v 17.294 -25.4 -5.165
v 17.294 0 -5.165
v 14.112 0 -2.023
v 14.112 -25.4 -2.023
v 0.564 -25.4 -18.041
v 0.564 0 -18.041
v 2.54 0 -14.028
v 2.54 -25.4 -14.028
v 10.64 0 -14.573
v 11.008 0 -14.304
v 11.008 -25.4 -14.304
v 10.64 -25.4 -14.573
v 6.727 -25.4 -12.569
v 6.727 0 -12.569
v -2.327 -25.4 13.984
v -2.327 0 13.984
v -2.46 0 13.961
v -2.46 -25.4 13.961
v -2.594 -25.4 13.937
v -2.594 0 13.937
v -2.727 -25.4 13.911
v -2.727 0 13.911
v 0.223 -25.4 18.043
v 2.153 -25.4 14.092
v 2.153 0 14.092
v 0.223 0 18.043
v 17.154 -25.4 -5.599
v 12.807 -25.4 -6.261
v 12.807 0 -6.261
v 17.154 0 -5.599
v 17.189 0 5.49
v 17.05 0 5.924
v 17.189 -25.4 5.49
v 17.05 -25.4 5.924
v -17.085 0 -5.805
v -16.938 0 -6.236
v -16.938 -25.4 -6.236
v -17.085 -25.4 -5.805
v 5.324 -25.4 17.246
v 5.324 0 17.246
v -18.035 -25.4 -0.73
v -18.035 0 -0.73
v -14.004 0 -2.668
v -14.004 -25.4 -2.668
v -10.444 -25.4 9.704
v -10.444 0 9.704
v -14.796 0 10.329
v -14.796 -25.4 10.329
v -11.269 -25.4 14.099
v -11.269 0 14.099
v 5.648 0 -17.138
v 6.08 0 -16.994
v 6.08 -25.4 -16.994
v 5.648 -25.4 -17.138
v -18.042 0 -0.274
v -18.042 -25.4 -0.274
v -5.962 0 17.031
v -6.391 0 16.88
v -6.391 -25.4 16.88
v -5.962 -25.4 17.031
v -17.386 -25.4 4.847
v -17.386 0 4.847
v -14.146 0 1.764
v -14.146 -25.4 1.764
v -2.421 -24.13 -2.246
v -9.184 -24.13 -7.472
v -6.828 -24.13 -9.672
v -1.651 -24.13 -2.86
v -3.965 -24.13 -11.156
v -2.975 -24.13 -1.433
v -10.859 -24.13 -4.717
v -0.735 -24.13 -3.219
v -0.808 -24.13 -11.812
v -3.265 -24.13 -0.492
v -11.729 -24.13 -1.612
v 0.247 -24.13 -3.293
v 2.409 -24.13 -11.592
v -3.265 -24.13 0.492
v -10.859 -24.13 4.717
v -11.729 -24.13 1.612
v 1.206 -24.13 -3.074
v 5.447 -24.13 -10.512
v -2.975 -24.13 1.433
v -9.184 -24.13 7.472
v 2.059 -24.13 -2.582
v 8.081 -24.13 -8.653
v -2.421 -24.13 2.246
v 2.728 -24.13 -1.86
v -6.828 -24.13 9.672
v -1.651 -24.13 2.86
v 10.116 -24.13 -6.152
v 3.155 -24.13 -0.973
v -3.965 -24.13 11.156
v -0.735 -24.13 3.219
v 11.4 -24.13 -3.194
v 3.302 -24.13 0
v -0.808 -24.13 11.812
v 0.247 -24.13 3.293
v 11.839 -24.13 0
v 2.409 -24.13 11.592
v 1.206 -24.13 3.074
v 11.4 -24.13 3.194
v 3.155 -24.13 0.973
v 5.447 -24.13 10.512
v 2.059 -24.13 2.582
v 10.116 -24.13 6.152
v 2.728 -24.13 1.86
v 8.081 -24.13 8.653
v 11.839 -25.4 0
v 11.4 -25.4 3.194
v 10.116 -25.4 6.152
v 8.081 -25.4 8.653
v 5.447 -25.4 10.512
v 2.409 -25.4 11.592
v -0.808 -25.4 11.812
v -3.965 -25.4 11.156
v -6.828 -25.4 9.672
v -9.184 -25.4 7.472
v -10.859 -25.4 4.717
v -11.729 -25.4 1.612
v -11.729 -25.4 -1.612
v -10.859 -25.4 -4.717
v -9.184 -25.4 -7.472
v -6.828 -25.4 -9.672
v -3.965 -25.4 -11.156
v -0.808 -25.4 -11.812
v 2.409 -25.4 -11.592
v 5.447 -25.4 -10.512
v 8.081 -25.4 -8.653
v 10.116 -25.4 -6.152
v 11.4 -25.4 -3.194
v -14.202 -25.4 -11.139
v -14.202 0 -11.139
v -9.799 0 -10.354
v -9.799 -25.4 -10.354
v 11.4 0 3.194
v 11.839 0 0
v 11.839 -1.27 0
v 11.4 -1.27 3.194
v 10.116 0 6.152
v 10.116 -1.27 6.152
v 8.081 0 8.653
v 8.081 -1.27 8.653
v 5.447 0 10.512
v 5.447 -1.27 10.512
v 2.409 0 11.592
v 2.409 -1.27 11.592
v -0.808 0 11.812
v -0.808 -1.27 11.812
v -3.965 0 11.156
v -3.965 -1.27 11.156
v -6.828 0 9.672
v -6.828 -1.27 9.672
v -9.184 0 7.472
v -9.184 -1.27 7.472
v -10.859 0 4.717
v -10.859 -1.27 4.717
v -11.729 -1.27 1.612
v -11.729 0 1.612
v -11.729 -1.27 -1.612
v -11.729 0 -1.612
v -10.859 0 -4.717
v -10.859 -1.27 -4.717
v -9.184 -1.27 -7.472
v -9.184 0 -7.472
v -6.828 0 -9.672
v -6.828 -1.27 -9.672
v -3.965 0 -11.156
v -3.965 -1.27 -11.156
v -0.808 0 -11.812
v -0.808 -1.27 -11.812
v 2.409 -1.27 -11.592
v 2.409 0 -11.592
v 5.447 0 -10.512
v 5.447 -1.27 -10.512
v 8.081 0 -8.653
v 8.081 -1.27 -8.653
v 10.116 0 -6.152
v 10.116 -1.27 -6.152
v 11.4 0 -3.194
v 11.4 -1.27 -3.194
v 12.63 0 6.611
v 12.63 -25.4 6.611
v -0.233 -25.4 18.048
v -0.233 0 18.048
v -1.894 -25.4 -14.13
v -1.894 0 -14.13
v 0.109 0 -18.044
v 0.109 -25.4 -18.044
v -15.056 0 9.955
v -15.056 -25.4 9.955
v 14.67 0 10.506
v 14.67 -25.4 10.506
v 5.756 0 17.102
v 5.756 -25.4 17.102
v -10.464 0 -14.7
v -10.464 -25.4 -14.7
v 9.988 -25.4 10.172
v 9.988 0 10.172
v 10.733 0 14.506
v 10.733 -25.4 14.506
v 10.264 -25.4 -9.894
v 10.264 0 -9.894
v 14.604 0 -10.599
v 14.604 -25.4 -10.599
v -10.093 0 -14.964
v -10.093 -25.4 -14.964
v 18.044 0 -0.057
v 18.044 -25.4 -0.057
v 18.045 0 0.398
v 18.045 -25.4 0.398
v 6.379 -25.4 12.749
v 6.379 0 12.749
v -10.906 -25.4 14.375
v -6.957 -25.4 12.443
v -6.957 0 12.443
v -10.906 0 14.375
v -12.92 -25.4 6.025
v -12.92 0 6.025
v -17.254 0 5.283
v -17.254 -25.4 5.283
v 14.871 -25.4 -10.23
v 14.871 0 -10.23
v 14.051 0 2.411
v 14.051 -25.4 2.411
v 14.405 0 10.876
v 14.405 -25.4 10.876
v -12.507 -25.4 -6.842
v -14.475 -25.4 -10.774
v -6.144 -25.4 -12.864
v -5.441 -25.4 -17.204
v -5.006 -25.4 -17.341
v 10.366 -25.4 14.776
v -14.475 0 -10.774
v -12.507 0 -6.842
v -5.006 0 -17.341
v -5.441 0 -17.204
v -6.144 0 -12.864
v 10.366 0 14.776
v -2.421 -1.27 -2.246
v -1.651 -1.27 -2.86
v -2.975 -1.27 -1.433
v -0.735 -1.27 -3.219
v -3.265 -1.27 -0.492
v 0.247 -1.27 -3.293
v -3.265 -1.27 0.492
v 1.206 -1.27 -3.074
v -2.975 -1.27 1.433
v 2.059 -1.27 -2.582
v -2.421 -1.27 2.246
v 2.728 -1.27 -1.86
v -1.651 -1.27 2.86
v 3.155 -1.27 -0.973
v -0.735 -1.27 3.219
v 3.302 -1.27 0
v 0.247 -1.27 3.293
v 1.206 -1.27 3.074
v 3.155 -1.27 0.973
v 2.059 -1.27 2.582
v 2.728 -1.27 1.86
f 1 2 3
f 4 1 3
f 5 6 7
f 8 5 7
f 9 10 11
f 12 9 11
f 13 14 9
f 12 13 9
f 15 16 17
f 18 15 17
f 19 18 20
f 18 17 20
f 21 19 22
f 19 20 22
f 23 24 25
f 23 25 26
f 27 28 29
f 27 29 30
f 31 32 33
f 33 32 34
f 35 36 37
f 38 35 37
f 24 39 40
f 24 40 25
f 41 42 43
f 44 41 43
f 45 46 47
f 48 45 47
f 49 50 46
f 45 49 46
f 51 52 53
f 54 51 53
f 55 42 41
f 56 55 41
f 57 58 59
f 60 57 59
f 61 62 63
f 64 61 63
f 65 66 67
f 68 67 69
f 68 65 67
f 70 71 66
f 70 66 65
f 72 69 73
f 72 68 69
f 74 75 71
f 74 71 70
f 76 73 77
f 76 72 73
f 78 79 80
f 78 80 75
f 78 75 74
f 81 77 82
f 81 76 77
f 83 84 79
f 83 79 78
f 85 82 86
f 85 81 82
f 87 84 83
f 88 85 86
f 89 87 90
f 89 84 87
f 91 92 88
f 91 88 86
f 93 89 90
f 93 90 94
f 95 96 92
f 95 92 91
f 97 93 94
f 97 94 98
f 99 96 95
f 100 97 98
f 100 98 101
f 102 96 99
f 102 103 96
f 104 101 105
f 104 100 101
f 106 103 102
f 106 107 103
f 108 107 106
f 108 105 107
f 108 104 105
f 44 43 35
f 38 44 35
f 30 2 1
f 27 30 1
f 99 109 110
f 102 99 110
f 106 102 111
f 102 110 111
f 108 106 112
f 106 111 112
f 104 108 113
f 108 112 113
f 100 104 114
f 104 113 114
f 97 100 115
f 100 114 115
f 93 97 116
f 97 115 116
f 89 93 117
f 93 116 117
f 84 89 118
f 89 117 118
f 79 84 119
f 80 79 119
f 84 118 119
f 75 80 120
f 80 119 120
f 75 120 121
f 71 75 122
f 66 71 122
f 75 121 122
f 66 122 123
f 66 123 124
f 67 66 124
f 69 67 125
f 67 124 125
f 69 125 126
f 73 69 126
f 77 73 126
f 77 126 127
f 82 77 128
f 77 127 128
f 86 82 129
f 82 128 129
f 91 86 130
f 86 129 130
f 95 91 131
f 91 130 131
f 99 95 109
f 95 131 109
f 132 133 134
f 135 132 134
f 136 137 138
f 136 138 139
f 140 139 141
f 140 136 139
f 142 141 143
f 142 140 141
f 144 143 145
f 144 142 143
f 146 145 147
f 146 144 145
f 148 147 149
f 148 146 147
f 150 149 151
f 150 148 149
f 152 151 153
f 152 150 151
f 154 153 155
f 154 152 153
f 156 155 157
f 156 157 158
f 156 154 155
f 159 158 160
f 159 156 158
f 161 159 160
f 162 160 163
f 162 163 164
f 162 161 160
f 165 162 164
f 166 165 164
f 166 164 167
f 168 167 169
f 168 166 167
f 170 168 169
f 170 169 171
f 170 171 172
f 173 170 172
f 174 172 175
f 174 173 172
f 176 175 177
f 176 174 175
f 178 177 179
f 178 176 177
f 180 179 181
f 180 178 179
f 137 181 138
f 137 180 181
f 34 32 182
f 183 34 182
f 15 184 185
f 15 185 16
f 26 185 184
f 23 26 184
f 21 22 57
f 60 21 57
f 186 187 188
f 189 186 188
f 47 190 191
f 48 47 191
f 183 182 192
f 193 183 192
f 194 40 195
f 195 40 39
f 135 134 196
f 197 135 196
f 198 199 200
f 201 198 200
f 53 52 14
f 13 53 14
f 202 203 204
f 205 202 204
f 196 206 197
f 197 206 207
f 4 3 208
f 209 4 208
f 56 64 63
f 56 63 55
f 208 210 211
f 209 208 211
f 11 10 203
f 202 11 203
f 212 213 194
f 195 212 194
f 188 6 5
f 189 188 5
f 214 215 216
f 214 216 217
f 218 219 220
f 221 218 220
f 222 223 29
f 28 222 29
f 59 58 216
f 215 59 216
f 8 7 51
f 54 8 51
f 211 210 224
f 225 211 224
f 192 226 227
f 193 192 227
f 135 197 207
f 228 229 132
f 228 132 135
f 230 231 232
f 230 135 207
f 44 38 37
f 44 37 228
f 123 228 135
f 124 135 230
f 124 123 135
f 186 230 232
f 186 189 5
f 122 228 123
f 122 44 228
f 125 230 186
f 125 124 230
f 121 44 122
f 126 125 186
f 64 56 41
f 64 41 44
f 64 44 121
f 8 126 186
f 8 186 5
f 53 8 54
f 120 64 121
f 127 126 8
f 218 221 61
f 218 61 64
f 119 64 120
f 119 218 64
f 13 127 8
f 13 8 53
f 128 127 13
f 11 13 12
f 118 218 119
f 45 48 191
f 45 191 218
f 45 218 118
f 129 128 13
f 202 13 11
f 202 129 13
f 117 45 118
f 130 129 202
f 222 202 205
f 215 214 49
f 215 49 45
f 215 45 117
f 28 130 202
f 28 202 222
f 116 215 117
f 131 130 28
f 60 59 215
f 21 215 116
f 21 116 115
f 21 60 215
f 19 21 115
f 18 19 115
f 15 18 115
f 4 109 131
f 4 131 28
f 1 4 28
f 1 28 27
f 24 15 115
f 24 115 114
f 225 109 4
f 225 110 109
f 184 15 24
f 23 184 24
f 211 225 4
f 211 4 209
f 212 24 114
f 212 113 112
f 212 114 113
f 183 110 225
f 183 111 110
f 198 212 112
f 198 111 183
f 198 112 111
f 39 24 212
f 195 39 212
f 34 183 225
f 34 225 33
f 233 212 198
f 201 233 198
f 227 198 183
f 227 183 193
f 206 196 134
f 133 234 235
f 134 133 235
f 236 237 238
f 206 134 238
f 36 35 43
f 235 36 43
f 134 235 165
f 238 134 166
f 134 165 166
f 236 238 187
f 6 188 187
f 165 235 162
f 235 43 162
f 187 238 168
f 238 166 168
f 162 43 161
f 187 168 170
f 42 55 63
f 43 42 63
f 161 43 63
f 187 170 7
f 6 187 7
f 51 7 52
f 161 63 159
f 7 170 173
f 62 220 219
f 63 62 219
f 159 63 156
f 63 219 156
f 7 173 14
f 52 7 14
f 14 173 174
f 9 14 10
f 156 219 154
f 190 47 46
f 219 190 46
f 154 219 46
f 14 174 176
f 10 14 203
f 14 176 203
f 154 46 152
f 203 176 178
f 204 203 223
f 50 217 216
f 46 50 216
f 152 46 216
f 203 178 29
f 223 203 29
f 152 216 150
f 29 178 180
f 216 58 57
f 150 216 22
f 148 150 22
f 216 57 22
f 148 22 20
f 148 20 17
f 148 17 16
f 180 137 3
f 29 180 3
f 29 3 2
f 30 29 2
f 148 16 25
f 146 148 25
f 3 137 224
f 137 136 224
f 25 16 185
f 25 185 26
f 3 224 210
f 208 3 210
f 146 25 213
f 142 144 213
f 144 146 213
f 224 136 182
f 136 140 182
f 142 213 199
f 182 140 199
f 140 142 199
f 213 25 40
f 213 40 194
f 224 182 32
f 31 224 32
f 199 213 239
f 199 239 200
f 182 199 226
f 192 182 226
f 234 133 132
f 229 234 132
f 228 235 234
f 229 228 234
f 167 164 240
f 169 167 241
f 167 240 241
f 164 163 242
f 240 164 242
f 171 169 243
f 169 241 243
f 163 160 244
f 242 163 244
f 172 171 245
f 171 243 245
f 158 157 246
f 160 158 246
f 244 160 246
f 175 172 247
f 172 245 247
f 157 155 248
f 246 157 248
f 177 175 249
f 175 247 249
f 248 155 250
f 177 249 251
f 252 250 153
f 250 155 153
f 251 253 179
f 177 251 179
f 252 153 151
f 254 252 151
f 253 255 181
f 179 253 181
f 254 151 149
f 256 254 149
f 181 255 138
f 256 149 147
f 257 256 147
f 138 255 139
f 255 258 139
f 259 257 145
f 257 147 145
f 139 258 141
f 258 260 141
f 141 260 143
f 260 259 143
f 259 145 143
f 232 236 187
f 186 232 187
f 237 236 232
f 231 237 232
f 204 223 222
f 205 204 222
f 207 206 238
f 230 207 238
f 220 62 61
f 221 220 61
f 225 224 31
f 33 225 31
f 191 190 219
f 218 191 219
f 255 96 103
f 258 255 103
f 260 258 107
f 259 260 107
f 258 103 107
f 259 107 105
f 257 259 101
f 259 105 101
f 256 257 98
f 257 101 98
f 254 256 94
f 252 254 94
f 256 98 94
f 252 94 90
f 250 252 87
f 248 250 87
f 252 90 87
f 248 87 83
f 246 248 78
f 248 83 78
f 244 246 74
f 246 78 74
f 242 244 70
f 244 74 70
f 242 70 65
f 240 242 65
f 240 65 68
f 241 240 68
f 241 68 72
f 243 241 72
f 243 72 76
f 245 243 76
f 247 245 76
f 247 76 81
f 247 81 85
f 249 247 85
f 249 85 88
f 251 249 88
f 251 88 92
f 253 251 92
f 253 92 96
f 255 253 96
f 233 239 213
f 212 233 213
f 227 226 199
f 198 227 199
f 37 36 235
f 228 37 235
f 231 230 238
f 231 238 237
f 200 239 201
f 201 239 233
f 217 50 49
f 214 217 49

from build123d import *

# Parameters (mm, degrees)
F1_DEPTH = 25.4
F2_SIZE  = 0.508
F3_R     = 3.302
F4_DEPTH = 25.401
F5_R     = 11.8393994815
F6_DEPTH = 1.27


# Not quite as in the source:
# - a pattern or mirror of a feature is missing from the dataset's text; its kind, count and spacing are read off the source's solid


with BuildPart() as f1:
    # F0 (on Front) → F1 (new body)
    with BuildSketch(Plane.XZ):
        with BuildLine():
            ThreePointArc((2.1955722256, 14.0049672679), (2.1389839725, 14.013721602), (2.0823608197, 14.0222472874))
            ThreePointArc((2.0823608197, 14.0222472874), (-0.1238177863, 14.1754828746), (-2.3269830694, 13.9837332414))
            ThreePointArc((-2.3269830694, 13.9837332414), (-2.5271600448, 13.9489464721), (-2.7268178935, 13.9112943233))
            ThreePointArc((-2.7268178935, 13.9112943233), (-4.8572204087, 13.3179223407), (-6.8694139522, 12.4004353764))
            ThreePointArc((-6.8694139522, 12.4004353764), (-6.9194470584, 12.3725865517), (-6.9693672664, 12.3445358551))
            ThreePointArc((-6.9693672664, 12.3445358551), (-8.7595213047, 11.1458706293), (-10.3473616978, 9.6897756149))
            ThreePointArc((-10.3473616978, 9.6897756149), (-10.3864172478, 9.6479004103), (-10.4253033325, 9.60586779))
            ThreePointArc((-10.4253033325, 9.60586779), (-11.7605415234, 7.9151316255), (-12.8241532244, 6.0415842004))
            ThreePointArc((-12.8241532244, 6.0415842004), (-12.8484524089, 5.9897342401), (-12.8725419575, 5.937786551))
            ThreePointArc((-12.8725419575, 5.937786551), (-13.6236736863, 3.9185661741), (-14.060147229, 1.8088409193))
            ThreePointArc((-14.060147229, 1.8088409193), (-14.067338987, 1.7520329324), (-14.0743012216, 1.6951963594))
            ThreePointArc((-14.0743012216, 1.6951963594), (-14.1686509384, -0.4571391014), (-13.9357554417, -2.5989162821))
            ThreePointArc((-13.9357554417, -2.5989162821), (-13.9251439365, -2.6551858539), (-13.914305228, -2.7114121035))
            ThreePointArc((-13.914305228, -2.7114121035), (-13.3427441511, -4.7886140051), (-12.4630133566, -6.7552160324))
            ThreePointArc((-12.4630133566, -6.7552160324), (-12.4356253016, -6.8055028418), (-12.4080343463, -6.8556786122))
            ThreePointArc((-12.4080343463, -6.8556786122), (-11.2258637152, -8.6567678391), (-9.7844157411, -10.2579166587))
            ThreePointArc((-9.7844157411, -10.2579166587), (-9.7429010602, -10.2973552188), (-9.7012274137, -10.3366257667))
            ThreePointArc((-9.7012274137, -10.3366257667), (-8.0228278321, -11.6873384117), (-6.1591295924, -12.768115297))
            ThreePointArc((-6.1591295924, -12.768115297), (-6.1075050275, -12.7928897404), (-6.0557808122, -12.8174554544))
            ThreePointArc((-6.0557808122, -12.8174554544), (-4.0435453838, -13.587103676), (-1.9379185041, -14.0429383479))
            ThreePointArc((-1.9379185041, -14.0429383479), (-1.8811789762, -14.0506516302), (-1.8244087549, -14.0581356612))
            ThreePointArc((-1.8244087549, -14.0581356612), (0.3269692188, -14.1722523511), (2.4707953718, -13.9590406477))
            ThreePointArc((2.4707953718, -13.9590406477), (2.5271600448, -13.9489464721), (2.5834834846, -13.9386247047))
            ThreePointArc((2.5834834846, -13.9386247047), (4.6658480019, -13.3861685331), (6.640448101, -12.5245396958))
            ThreePointArc((6.640448101, -12.5245396958), (6.6909843703, -12.4976147216), (6.7414114691, -12.4704858356))
            ThreePointArc((6.7414114691, -12.4704858356), (8.5532839071, -11.3049095519), (10.1676060468, -9.8782302489))
            ThreePointArc((10.1676060468, -9.8782302489), (10.2074242891, -9.8370795948), (10.2470759865, -9.7957684384))
            ThreePointArc((10.2470759865, -9.7957684384), (11.613149111, -8.1298470648), (12.7109999837, -6.2761552711))
            ThreePointArc((12.7109999837, -6.2761552711), (12.7362475956, -6.2247604577), (12.7612874022, -6.1732640808))
            ThreePointArc((12.7612874022, -6.1732640808), (13.5493871727, -4.1681833951), (14.0245445102, -2.0668325655))
            ThreePointArc((14.0245445102, -2.0668325655), (14.0327786658, -2.0101662842), (14.0407838617, -1.953467205))
            ThreePointArc((14.0407838617, -1.953467205), (14.1421732628, -0.9790714877), (14.1760236164, 0))
            ThreePointArc((14.1760236164, 0), (14.127220701, 1.1752790468), (13.9811479763, 2.3424659733))
            ThreePointArc((13.9811479763, 2.3424659733), (13.971571982, 2.3989209915), (13.9617680268, 2.4553368688))
            ThreePointArc((13.9617680268, 2.4553368688), (13.4284633772, 4.54268829), (12.5850092021, 6.5251198421))
            ThreePointArc((12.5850092021, 6.5251198421), (12.5585495807, 6.5759013071), (12.5318850533, 6.6265754793))
            ThreePointArc((12.5318850533, 6.6265754793), (11.3830014695, 8.4490782407), (9.971211222, 10.0764374825))
            ThreePointArc((9.971211222, 10.0764374825), (9.9304280671, 10.1166320471), (9.8894828868, 10.1566615482))
            ThreePointArc((9.8894828868, 10.1566615482), (8.2361802932, 11.5379798817), (6.3926513618, 12.652812104))
            ThreePointArc((6.3926513618, 12.652812104), (6.3414906367, 12.6785307539), (6.2902264434, 12.7040425402))
            ThreePointArc((6.2902264434, 12.7040425402), (4.2924696912, 13.5105273592), (2.1955722256, 14.0049672679))
        make_face()
        with BuildLine():
            Line((2.1528735086, 14.0923740697), (2.0823608197, 14.0222472874))
            ThreePointArc((2.0823608197, 14.0222472874), (2.1389839725, 14.013721602), (2.1955722256, 14.0049672679))
            Line((2.1955722256, 14.0049672679), (2.1528735086, 14.0923740697))
        make_face()
        with BuildLine():
            ThreePointArc((-2.3269830694, 13.9837332414), (-0.1238177863, 14.1754828746), (2.0823608197, 14.0222472874))
            Line((2.0823608197, 14.0222472874), (2.1528735086, 14.0923740697))
            Line((2.1528735086, 14.0923740697), (0, 18.4994336074))
            Line((0, 18.4994336074), (-2.3269830694, 13.9837332414))
        make_face()
        with BuildLine():
            Line((2.1528735086, 14.0923740697), (2.1955722256, 14.0049672679))
            ThreePointArc((2.1955722256, 14.0049672679), (4.2924696912, 13.5105273592), (6.2902264434, 12.7040425402))
            Line((6.2902264434, 12.7040425402), (6.3788757147, 12.7491103956))
            Line((6.3788757147, 12.7491103956), (5.6843062312, 17.6044797271))
            Line((5.6843062312, 17.6044797271), (2.1528735086, 14.0923740697))
        make_face()
        with BuildLine():
            ThreePointArc((-6.8694139522, 12.4004353764), (-4.8572204087, 13.3179223407), (-2.7268178935, 13.9112943233))
            Line((-2.7268178935, 13.9112943233), (-6.3271789338, 17.3837812496))
            Line((-6.3271789338, 17.3837812496), (-6.9567956084, 12.4431855297))
            Line((-6.9567956084, 12.4431855297), (-6.8694139522, 12.4004353764))
        make_face()
        with BuildLine():
            Line((6.3788757147, 12.7491103956), (6.2902264434, 12.7040425402))
            ThreePointArc((6.2902264434, 12.7040425402), (6.3414906367, 12.6785307539), (6.3926513618, 12.652812104))
            Line((6.3926513618, 12.652812104), (6.3788757147, 12.7491103956))
        make_face()
        with BuildLine():
            ThreePointArc((-6.9693672664, 12.3445358551), (-6.9194470584, 12.3725865517), (-6.8694139522, 12.4004353764))
            Line((-6.8694139522, 12.4004353764), (-6.9567956084, 12.4431855297))
            Line((-6.9567956084, 12.4431855297), (-6.9693672664, 12.3445358551))
        make_face()
        with BuildLine():
            Line((6.3788757147, 12.7491103956), (6.3926513618, 12.652812104))
            ThreePointArc((6.3926513618, 12.652812104), (8.2361802932, 11.5379798817), (9.8894828868, 10.1566615482))
            Line((9.8894828868, 10.1566615482), (9.9876915038, 10.1723099485))
            Line((9.9876915038, 10.1723099485), (10.8186289304, 15.0062091102))
            Line((10.8186289304, 15.0062091102), (6.3788757147, 12.7491103956))
        make_face()
        with BuildLine():
            ThreePointArc((-10.3473616978, 9.6897756149), (-8.7595213047, 11.1458706293), (-6.9693672664, 12.3445358551))
            Line((-6.9693672664, 12.3445358551), (-6.9567956084, 12.4431855297))
            Line((-6.9567956084, 12.4431855297), (-11.3625872992, 14.5986524605))
            Line((-11.3625872992, 14.5986524605), (-10.443651865, 9.7036079365))
            Line((-10.443651865, 9.7036079365), (-10.3473616978, 9.6897756149))
        make_face()
        with BuildLine():
            Line((9.9876915038, 10.1723099485), (9.8894828868, 10.1566615482))
            ThreePointArc((9.8894828868, 10.1566615482), (9.9304280671, 10.1166320471), (9.971211222, 10.0764374825))
            Line((9.971211222, 10.0764374825), (9.9876915038, 10.1723099485))
        make_face()
        with BuildLine():
            ThreePointArc((-10.4253033325, 9.60586779), (-10.3864172478, 9.6479004103), (-10.3473616978, 9.6897756149))
            Line((-10.3473616978, 9.6897756149), (-10.443651865, 9.7036079365))
            Line((-10.443651865, 9.7036079365), (-10.4253033325, 9.60586779))
        make_face()
        with BuildLine():
            Line((9.9876915038, 10.1723099485), (9.971211222, 10.0764374825))
            ThreePointArc((9.971211222, 10.0764374825), (11.3830014695, 8.4490782407), (12.5318850533, 6.6265754793))
            Line((12.5318850533, 6.6265754793), (12.6301508676, 6.6112903677))
            Line((12.6301508676, 6.6112903677), (14.9061980753, 10.9560167366))
            Line((14.9061980753, 10.9560167366), (9.9876915038, 10.1723099485))
        make_face()
        with BuildLine():
            ThreePointArc((-12.8241532244, 6.0415842004), (-11.7605415234, 7.9151316255), (-10.4253033325, 9.60586779))
            Line((-10.4253033325, 9.60586779), (-10.443651865, 9.7036079365))
            Line((-10.443651865, 9.7036079365), (-15.2986115636, 10.4010349495))
            Line((-15.2986115636, 10.4010349495), (-12.9200353733, 6.0251603477))
            Line((-12.9200353733, 6.0251603477), (-12.8241532244, 6.0415842004))
        make_face()
        with BuildLine():
            Line((12.6301508676, 6.6112903677), (12.5318850533, 6.6265754793))
            ThreePointArc((12.5318850533, 6.6265754793), (12.5585495807, 6.5759013071), (12.5850092021, 6.5251198421))
            Line((12.5850092021, 6.5251198421), (12.6301508676, 6.6112903677))
        make_face()
        with BuildLine():
            ThreePointArc((-12.8725419575, 5.937786551), (-12.8484524089, 5.9897342401), (-12.8241532244, 6.0415842004))
            Line((-12.8241532244, 6.0415842004), (-12.9200353733, 6.0251603477))
            Line((-12.9200353733, 6.0251603477), (-12.8725419575, 5.937786551))
        make_face()
        with BuildLine():
            Line((12.6301508676, 6.6112903677), (12.5850092021, 6.5251198421))
            ThreePointArc((12.5850092021, 6.5251198421), (13.4284633772, 4.54268829), (13.9617680268, 2.4553368688))
            Line((13.9617680268, 2.4553368688), (14.0505833556, 2.4105971522))
            Line((14.0505833556, 2.4105971522), (17.5515220045, 5.8457778882))
            Line((17.5515220045, 5.8457778882), (12.6301508676, 6.6112903677))
        make_face()
        with BuildLine():
            ThreePointArc((-14.060147229, 1.8088409193), (-13.6236736863, 3.9185661741), (-12.8725419575, 5.937786551))
            Line((-12.8725419575, 5.937786551), (-12.9200353733, 6.0251603477))
            Line((-12.9200353733, 6.0251603477), (-17.7544227499, 5.1970680784))
            Line((-17.7544227499, 5.1970680784), (-14.146344308, 1.7637499777))
            Line((-14.146344308, 1.7637499777), (-14.060147229, 1.8088409193))
        make_face()
        with BuildLine():
            Line((14.0505833556, 2.4105971522), (13.9617680268, 2.4553368688))
            ThreePointArc((13.9617680268, 2.4553368688), (13.971571982, 2.3989209915), (13.9811479763, 2.3424659733))
            Line((13.9811479763, 2.3424659733), (14.0505833556, 2.4105971522))
        make_face()
        with BuildLine():
            ThreePointArc((-14.0743012216, 1.6951963594), (-14.067338987, 1.7520329324), (-14.060147229, 1.8088409193))
            Line((-14.060147229, 1.8088409193), (-14.146344308, 1.7637499777))
            Line((-14.146344308, 1.7637499777), (-14.0743012216, 1.6951963594))
        make_face()
        with BuildLine():
            Line((14.0505833556, 2.4105971522), (13.9811479763, 2.3424659733))
            ThreePointArc((13.9811479763, 2.3424659733), (14.127220701, 1.1752790468), (14.1760236164, 0))
            ThreePointArc((14.1760236164, 0), (14.1421732628, -0.9790714877), (14.0407838617, -1.953467205))
            Line((14.0407838617, -1.953467205), (14.1115554018, -2.0233327473))
            Line((14.1115554018, -2.0233327473), (18.4986531073, 0.1699323607))
            Line((18.4986531073, 0.1699323607), (14.0505833556, 2.4105971522))
        make_face()
        with BuildLine():
            ThreePointArc((-13.9357554417, -2.5989162821), (-14.1686509384, -0.4571391014), (-14.0743012216, 1.6951963594))
            Line((-14.0743012216, 1.6951963594), (-14.146344308, 1.7637499777))
            Line((-14.146344308, 1.7637499777), (-18.4924095024, -0.5097397272))
            Line((-18.4924095024, -0.5097397272), (-14.0039274753, -2.6683115505))
            Line((-14.0039274753, -2.6683115505), (-13.9357554417, -2.5989162821))
        make_face()
        with BuildLine():
            ThreePointArc((-13.914305228, -2.7114121035), (-13.9251439365, -2.6551858539), (-13.9357554417, -2.5989162821))
            Line((-13.9357554417, -2.5989162821), (-14.0039274753, -2.6683115505))
            Line((-14.0039274753, -2.6683115505), (-13.914305228, -2.7114121035))
        make_face()
        with BuildLine():
            Line((14.1115554018, -2.0233327473), (14.0407838617, -1.953467205))
            ThreePointArc((14.0407838617, -1.953467205), (14.0327786658, -2.0101662842), (14.0245445102, -2.0668325655))
            Line((14.0245445102, -2.0668325655), (14.1115554018, -2.0233327473))
        make_face()
        with BuildLine():
            Line((17.6559519668, -5.5223549269), (14.1115554018, -2.0233327473))
            Line((14.1115554018, -2.0233327473), (14.0245445102, -2.0668325655))
            ThreePointArc((14.0245445102, -2.0668325655), (13.5493871727, -4.1681833951), (12.7612874022, -6.1732640808))
            Line((12.7612874022, -6.1732640808), (12.8071676719, -6.261495627))
            Line((12.8071676719, -6.261495627), (17.6559519668, -5.5223549269))
        make_face()
        with BuildLine():
            ThreePointArc((-12.4630133566, -6.7552160324), (-13.3427441511, -4.7886140051), (-13.914305228, -2.7114121035))
            Line((-13.914305228, -2.7114121035), (-14.0039274753, -2.6683115505))
            Line((-14.0039274753, -2.6683115505), (-17.4411681098, -6.1672278017))
            Line((-17.4411681098, -6.1672278017), (-12.5065643779, -6.8422013069))
            Line((-12.5065643779, -6.8422013069), (-12.4630133566, -6.7552160324))
        make_face()
        with BuildLine():
            ThreePointArc((-12.4080343463, -6.8556786122), (-12.4356253016, -6.8055028418), (-12.4630133566, -6.7552160324))
            Line((-12.4630133566, -6.7552160324), (-12.5065643779, -6.8422013069))
            Line((-12.5065643779, -6.8422013069), (-12.4080343463, -6.8556786122))
        make_face()
        with BuildLine():
            Line((12.8071676719, -6.261495627), (12.7612874022, -6.1732640808))
            ThreePointArc((12.7612874022, -6.1732640808), (12.7362475956, -6.2247604577), (12.7109999837, -6.2761552711))
            Line((12.7109999837, -6.2761552711), (12.8071676719, -6.261495627))
        make_face()
        with BuildLine():
            Line((15.1049539068, -10.6803282378), (12.8071676719, -6.261495627))
            Line((12.8071676719, -6.261495627), (12.7109999837, -6.2761552711))
            ThreePointArc((12.7109999837, -6.2761552711), (11.613149111, -8.1298470648), (10.2470759865, -9.7957684384))
            Line((10.2470759865, -9.7957684384), (10.2636258527, -9.8938291687))
            Line((10.2636258527, -9.8938291687), (15.1049539068, -10.6803282378))
        make_face()
        with BuildLine():
            ThreePointArc((-9.7844157411, -10.2579166587), (-11.2258637152, -8.6567678391), (-12.4080343463, -6.8556786122))
            Line((-12.4080343463, -6.8556786122), (-12.5065643779, -6.8422013069))
            Line((-12.5065643779, -6.8422013069), (-14.7024111525, -11.2280073964))
            Line((-14.7024111525, -11.2280073964), (-9.7991319827, -10.3540757023))
            Line((-9.7991319827, -10.3540757023), (-9.7844157411, -10.2579166587))
        make_face()
        with BuildLine():
            ThreePointArc((-9.7012274137, -10.3366257667), (-9.7429010602, -10.2973552188), (-9.7844157411, -10.2579166587))
            Line((-9.7844157411, -10.2579166587), (-9.7991319827, -10.3540757023))
            Line((-9.7991319827, -10.3540757023), (-9.7012274137, -10.3366257667))
        make_face()
        with BuildLine():
            Line((10.2636258527, -9.8938291687), (10.2470759865, -9.7957684384))
            ThreePointArc((10.2470759865, -9.7957684384), (10.2074242891, -9.8370795948), (10.1676060468, -9.8782302489))
            Line((10.1676060468, -9.8782302489), (10.2636258527, -9.8938291687))
        make_face()
        with BuildLine():
            Line((11.0924800636, -14.804929241), (10.2636258527, -9.8938291687))
            Line((10.2636258527, -9.8938291687), (10.1676060468, -9.8782302489))
            ThreePointArc((10.1676060468, -9.8782302489), (8.5532839071, -11.3049095519), (6.7414114691, -12.4704858356))
            Line((6.7414114691, -12.4704858356), (6.7270296539, -12.5688879102))
            Line((6.7270296539, -12.5688879102), (11.0924800636, -14.804929241))
        make_face()
        with BuildLine():
            ThreePointArc((-6.1591295924, -12.768115297), (-8.0228278321, -11.6873384117), (-9.7012274137, -10.3366257667))
            Line((-9.7012274137, -10.3366257667), (-9.7991319827, -10.3540757023))
            Line((-9.7991319827, -10.3540757023), (-10.5411263289, -15.2024241328))
            Line((-10.5411263289, -15.2024241328), (-6.1435871882, -12.8641442671))
            Line((-6.1435871882, -12.8641442671), (-6.1591295924, -12.768115297))
        make_face()
        with BuildLine():
            ThreePointArc((-6.0557808122, -12.8174554544), (-6.1075050275, -12.7928897404), (-6.1591295924, -12.768115297))
            Line((-6.1591295924, -12.768115297), (-6.1435871882, -12.8641442671))
            Line((-6.1435871882, -12.8641442671), (-6.0557808122, -12.8174554544))
        make_face()
        with BuildLine():
            Line((6.7270296539, -12.5688879102), (6.7414114691, -12.4704858356))
            ThreePointArc((6.7414114691, -12.4704858356), (6.6909843703, -12.4976147216), (6.640448101, -12.5245396958))
            Line((6.640448101, -12.5245396958), (6.7270296539, -12.5688879102))
        make_face()
        with BuildLine():
            Line((6.0067562729, -17.4970832675), (6.7270296539, -12.5688879102))
            Line((6.7270296539, -12.5688879102), (6.640448101, -12.5245396958))
            ThreePointArc((6.640448101, -12.5245396958), (4.6658480019, -13.3861685331), (2.5834834846, -13.9386247047))
            Line((2.5834834846, -13.9386247047), (2.5395614967, -14.0278472571))
            Line((2.5395614967, -14.0278472571), (6.0067562729, -17.4970832675))
        make_face()
        with BuildLine():
            ThreePointArc((-1.9379185041, -14.0429383479), (-4.0435453838, -13.587103676), (-6.0557808122, -12.8174554544))
            Line((-6.0557808122, -12.8174554544), (-6.1435871882, -12.8641442671))
            Line((-6.1435871882, -12.8641442671), (-5.359937641, -17.7059343802))
            Line((-5.359937641, -17.7059343802), (-1.8936212553, -14.1295459872))
            Line((-1.8936212553, -14.1295459872), (-1.9379185041, -14.0429383479))
        make_face()
        with BuildLine():
            ThreePointArc((-1.8244087549, -14.0581356612), (-1.8811789762, -14.0506516302), (-1.9379185041, -14.0429383479))
            Line((-1.9379185041, -14.0429383479), (-1.8936212553, -14.1295459872))
            Line((-1.8936212553, -14.1295459872), (-1.8244087549, -14.0581356612))
        make_face()
        with BuildLine():
            Line((2.5395614967, -14.0278472571), (2.5834834846, -13.9386247047))
            ThreePointArc((2.5834834846, -13.9386247047), (2.5271600448, -13.9489464721), (2.4707953718, -13.9590406477))
            Line((2.4707953718, -13.9590406477), (2.5395614967, -14.0278472571))
        make_face()
        with BuildLine():
            Line((0.3398503824, -18.4963116732), (2.5395614967, -14.0278472571))
            Line((2.5395614967, -14.0278472571), (2.4707953718, -13.9590406477))
            ThreePointArc((2.4707953718, -13.9590406477), (0.3269692188, -14.1722523511), (-1.8244087549, -14.0581356612))
            Line((-1.8244087549, -14.0581356612), (-1.8936212553, -14.1295459872))
            Line((-1.8936212553, -14.1295459872), (0.3398503824, -18.4963116732))
        make_face()
    extrude(amount=F1_DEPTH)

    # F2
    f2_edges = [f1.edges().sort_by_distance(p)[0] for p in [
        (0, -12.7, 18.499434),
        (5.684306, -12.7, 17.60448),
        (10.818629, -12.7, 15.006209),
        (14.906198, -12.7, 10.956017),
        (17.551522, -12.7, 5.845778),
        (18.498653, -12.7, 0.169932),
        (17.655952, -12.7, -5.522355),
        (15.104954, -12.7, -10.680328),
        (11.09248, -12.7, -14.804929),
        (6.006756, -12.7, -17.497083),
        (0.33985, -12.7, -18.496312),
        (-5.359938, -12.7, -17.705934),
        (-10.541126, -12.7, -15.202424),
        (-14.702411, -12.7, -11.228007),
        (-17.441168, -12.7, -6.167228),
        (-18.49241, -12.7, -0.50974),
        (-17.754423, -12.7, 5.197068),
        (-15.298612, -12.7, 10.401035),
        (-11.362587, -12.7, 14.598652),
        (-6.327179, -12.7, 17.383781),
    ]]
    chamfer(f2_edges, length=F2_SIZE)

    # F3 (on face) → F4 (cut, through all)
    with BuildSketch(Plane.XZ.offset(25.4)):
        Circle(F3_R)
    extrude(amount=-F4_DEPTH, mode=Mode.SUBTRACT)

    # F5 (on face) → F6 (cut)
    with BuildSketch(Plane.XZ.offset(25.4)):
        Circle(F5_R)
    f6 = extrude(amount=-F6_DEPTH, mode=Mode.SUBTRACT)

    # F6_copies: F6 across plane
    add(f6.mirror(Plane.ZX.offset(-12.7)), mode=Mode.SUBTRACT)


solid = f1.part
